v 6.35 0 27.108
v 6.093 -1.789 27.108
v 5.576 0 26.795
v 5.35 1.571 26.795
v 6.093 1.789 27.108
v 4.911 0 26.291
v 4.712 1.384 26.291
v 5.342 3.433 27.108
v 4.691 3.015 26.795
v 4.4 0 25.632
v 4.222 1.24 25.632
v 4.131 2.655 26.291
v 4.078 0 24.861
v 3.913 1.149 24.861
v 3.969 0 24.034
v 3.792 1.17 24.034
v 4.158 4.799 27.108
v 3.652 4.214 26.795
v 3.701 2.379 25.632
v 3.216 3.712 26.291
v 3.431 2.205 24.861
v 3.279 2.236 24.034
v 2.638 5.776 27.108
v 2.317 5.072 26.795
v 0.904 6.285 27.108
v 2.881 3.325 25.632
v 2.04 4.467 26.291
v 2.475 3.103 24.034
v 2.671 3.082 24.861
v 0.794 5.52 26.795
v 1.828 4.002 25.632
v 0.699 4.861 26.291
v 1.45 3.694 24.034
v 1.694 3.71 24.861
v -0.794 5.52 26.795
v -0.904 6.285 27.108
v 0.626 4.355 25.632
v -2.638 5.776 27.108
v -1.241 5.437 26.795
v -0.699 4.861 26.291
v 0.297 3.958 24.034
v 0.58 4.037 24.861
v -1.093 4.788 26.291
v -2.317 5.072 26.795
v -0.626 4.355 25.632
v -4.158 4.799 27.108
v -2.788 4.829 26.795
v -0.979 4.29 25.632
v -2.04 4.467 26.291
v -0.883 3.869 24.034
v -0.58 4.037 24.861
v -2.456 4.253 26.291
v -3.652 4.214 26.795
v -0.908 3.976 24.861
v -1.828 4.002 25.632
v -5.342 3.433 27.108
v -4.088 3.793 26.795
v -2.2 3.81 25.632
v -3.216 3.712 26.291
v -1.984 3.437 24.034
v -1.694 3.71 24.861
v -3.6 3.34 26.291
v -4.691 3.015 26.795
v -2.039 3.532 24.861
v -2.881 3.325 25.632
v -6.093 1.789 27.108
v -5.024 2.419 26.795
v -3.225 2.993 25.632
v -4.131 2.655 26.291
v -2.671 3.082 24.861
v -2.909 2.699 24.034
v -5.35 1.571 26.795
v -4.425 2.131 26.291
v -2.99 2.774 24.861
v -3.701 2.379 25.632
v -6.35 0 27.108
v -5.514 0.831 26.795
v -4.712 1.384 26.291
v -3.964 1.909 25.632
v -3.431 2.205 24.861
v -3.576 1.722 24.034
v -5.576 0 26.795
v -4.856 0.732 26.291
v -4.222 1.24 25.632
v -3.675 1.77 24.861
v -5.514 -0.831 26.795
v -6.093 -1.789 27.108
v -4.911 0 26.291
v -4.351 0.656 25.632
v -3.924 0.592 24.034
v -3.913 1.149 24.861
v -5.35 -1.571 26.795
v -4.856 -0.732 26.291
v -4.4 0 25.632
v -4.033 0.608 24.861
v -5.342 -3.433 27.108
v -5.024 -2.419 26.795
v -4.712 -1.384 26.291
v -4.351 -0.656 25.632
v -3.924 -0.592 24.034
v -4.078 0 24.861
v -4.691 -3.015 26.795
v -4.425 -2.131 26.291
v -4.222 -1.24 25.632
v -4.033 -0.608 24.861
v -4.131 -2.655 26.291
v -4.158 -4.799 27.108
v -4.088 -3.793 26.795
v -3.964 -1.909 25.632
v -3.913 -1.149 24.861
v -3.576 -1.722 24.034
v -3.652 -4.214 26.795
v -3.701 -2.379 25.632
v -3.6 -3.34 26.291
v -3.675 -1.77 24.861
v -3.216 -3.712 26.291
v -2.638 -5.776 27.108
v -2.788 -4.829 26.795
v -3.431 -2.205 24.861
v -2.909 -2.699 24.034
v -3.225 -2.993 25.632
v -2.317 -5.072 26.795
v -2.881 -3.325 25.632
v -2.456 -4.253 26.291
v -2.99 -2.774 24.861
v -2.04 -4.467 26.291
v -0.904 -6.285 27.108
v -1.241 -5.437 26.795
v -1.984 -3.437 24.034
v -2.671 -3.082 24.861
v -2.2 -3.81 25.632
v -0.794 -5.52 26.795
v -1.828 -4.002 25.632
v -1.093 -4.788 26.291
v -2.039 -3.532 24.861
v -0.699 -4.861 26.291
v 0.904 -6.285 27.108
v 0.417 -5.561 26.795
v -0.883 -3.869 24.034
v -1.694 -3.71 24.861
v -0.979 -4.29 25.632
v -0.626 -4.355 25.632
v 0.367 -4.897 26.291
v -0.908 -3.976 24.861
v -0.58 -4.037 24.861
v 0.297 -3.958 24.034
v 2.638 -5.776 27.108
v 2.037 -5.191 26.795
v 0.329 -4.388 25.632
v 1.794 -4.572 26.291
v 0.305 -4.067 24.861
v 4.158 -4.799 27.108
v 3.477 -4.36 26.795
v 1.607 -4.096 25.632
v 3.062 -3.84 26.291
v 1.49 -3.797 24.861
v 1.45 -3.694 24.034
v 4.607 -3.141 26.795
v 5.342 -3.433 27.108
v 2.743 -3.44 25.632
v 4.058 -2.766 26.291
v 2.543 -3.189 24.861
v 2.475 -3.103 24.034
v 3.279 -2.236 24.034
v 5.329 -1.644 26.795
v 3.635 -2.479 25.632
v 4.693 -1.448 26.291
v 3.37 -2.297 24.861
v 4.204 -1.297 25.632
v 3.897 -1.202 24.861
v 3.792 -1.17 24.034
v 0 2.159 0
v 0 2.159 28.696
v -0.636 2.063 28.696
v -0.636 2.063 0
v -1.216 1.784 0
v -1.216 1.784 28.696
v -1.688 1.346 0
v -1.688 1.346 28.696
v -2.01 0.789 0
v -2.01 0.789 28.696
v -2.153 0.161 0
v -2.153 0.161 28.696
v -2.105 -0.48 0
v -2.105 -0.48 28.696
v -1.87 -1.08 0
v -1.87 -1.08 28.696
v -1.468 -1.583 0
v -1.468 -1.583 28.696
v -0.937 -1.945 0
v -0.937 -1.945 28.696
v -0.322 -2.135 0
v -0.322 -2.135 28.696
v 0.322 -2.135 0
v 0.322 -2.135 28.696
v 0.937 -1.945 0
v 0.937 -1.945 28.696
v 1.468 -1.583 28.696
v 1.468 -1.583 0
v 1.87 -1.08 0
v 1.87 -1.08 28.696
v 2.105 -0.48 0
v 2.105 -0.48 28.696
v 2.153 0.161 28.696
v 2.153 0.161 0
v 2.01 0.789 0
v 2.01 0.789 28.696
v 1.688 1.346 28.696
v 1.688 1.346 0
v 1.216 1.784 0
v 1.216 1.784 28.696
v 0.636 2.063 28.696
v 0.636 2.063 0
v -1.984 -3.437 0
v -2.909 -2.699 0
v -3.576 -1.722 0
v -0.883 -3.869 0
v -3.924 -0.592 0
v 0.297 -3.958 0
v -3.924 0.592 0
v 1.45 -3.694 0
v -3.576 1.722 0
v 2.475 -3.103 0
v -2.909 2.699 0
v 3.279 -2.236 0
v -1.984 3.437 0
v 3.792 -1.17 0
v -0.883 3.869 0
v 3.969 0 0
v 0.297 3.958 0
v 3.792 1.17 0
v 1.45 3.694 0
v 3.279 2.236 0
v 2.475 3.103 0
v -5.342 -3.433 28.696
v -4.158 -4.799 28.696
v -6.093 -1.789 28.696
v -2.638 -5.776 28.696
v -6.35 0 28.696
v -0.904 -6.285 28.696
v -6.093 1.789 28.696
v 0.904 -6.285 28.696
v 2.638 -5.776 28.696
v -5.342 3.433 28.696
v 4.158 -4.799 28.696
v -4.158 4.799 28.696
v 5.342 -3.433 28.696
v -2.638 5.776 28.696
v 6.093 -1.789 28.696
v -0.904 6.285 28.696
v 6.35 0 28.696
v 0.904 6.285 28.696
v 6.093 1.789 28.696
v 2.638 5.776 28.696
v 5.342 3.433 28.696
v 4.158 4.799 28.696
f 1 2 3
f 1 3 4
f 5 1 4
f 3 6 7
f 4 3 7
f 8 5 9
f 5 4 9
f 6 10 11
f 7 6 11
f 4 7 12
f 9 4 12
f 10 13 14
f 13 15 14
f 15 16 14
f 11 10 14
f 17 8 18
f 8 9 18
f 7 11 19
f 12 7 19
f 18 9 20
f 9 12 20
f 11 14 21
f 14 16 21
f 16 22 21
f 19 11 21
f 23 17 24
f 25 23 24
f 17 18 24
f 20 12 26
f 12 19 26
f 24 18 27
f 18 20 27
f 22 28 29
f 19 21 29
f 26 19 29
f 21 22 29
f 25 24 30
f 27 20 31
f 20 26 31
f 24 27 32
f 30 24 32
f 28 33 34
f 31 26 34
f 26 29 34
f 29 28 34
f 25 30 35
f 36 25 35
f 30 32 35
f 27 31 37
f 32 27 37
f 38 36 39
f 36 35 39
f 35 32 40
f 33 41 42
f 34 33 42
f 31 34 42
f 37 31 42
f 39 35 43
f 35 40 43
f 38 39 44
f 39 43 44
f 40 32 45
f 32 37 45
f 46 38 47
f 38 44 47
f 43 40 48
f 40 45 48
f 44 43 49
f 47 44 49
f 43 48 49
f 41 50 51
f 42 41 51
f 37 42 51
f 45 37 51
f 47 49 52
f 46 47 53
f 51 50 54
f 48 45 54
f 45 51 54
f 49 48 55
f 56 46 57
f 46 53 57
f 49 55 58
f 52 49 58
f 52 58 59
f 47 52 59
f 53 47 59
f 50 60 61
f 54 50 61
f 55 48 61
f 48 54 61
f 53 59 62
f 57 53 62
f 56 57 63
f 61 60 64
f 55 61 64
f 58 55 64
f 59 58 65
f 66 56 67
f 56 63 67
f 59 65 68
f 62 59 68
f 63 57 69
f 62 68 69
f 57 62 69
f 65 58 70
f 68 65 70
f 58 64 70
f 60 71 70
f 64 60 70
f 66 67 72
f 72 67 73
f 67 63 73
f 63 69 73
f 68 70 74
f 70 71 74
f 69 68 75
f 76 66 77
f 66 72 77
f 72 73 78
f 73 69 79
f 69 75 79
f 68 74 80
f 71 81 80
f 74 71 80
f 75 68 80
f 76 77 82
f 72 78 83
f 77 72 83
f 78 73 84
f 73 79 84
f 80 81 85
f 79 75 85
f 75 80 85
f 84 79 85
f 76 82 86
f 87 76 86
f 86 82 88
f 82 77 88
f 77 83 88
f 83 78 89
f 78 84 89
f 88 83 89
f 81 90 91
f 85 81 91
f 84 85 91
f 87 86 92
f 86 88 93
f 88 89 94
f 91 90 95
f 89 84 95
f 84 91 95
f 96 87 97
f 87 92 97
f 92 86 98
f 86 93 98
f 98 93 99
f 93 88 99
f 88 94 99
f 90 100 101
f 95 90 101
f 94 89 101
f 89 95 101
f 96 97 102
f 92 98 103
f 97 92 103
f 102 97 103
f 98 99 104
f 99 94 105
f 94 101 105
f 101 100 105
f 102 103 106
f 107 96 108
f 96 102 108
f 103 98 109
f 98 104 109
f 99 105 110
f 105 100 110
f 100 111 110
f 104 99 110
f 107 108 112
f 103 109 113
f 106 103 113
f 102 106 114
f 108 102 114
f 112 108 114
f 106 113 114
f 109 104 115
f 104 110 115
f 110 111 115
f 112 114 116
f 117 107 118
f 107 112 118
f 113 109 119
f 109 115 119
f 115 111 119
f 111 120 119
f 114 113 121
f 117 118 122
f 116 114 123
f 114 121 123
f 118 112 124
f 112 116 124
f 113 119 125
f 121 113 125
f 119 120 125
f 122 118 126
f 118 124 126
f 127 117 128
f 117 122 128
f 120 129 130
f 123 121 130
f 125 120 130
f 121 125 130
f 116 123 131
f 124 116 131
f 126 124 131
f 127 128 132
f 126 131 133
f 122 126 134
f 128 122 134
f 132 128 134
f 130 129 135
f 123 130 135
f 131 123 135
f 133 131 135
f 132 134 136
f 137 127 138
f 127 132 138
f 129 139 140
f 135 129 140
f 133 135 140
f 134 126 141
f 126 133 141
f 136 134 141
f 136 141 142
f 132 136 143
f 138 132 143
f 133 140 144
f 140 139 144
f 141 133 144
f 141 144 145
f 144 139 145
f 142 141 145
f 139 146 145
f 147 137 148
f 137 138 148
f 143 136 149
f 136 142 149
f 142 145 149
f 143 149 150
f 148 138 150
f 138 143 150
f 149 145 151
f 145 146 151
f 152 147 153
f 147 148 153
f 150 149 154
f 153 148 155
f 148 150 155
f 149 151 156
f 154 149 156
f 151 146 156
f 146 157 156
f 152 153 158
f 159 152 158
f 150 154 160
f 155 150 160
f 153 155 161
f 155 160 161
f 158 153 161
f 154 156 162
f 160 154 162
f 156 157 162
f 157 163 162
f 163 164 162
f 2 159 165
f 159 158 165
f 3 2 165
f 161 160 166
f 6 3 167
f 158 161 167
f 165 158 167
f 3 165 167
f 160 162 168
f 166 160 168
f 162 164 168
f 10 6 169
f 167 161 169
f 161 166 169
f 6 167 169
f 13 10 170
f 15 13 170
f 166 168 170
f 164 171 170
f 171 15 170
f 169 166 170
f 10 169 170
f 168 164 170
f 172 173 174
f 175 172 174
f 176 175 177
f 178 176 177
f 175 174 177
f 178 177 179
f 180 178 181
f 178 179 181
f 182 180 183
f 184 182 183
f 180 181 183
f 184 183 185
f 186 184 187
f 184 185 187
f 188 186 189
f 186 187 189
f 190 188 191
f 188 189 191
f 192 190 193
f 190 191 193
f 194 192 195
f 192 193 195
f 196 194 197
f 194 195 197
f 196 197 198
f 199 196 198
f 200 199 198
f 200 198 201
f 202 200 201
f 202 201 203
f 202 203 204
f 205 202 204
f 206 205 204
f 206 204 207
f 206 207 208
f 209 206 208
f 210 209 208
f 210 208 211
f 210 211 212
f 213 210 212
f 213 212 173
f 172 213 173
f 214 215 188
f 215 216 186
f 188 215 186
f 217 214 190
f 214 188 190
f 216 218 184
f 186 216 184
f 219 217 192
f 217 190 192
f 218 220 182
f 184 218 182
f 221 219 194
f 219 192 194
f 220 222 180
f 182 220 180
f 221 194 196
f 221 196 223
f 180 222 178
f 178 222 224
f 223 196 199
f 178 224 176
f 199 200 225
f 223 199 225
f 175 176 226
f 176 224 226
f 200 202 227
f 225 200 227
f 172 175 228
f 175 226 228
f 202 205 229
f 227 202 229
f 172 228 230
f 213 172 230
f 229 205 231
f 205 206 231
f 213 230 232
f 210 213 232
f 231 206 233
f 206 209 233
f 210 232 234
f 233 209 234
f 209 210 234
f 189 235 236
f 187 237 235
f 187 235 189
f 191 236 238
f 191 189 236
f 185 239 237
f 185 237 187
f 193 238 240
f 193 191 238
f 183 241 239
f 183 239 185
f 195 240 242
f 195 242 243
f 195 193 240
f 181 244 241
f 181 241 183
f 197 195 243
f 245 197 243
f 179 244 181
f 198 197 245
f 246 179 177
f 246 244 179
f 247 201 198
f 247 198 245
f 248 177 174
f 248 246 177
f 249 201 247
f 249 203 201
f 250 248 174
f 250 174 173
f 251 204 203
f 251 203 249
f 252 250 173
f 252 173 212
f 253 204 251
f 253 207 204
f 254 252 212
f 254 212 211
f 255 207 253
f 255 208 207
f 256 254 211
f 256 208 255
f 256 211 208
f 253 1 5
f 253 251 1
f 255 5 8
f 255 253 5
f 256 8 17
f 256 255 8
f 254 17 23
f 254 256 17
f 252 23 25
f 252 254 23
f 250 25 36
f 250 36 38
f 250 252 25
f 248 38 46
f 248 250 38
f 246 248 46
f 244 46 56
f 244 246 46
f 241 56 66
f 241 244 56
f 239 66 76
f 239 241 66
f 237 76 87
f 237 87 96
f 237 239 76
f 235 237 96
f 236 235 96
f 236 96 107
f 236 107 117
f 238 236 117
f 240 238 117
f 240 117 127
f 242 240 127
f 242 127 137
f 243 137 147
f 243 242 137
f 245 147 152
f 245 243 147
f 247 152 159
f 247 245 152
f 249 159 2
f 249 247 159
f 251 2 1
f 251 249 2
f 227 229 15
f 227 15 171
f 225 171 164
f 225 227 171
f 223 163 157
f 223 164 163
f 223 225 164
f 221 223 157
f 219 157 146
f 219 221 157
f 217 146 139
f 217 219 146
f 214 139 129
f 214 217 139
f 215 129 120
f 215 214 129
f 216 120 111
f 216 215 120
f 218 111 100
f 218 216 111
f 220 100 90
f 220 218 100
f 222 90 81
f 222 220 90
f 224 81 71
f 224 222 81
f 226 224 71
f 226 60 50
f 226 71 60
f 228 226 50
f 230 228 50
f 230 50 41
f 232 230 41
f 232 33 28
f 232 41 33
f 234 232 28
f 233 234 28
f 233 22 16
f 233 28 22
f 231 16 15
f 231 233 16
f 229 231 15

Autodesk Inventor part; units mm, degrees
ref_plane "YZ Plane" through (0, 0, 0) normal (1, 0, 0) x (0, 1, 0)
ref_plane "XZ Plane" through (0, 0, 0) normal (0, 1, 0) x (-1, 0, 0)
ref_plane "XY Plane" through (0, 0, 0) normal (0, 0, 1) x (1, 0, 0)
sketch "Sketch1" plane through (0, 0, 0) normal (0, 0, 1) x (1, 0, 0)
  circle A0 centre (0, 0) radius 3.9688
  dimension "d0" = 7.9375
extrude "Extrusion1" add sketch "Sketch1" along normal blind 28.6957
hole "Hole1" at (0, 0, 0) direction (0, 0, 1) diameter 4.318 end through all clearance for "Socket Head Cap Screw" size "#8" standard "Ansi Unified Screw Threads"
sketch "Sketch2" plane through (0, 0, 28.6957) normal (0, 0, 1) x (1, 0, 0)
  circle A0 centre (0, 0) radius 3.9687 projected
  circle A1 centre (0, 0) radius 6.35
  dimension "d10" = 12.7
extrude "Extrusion2" add sketch "Sketch2" against normal blind 1.5875
fillet "Fillet1" radius 3.175 1 edges at (-3.9687, 0, 27.1082)
properties part number "Supporting Plate Standoff Thin"
